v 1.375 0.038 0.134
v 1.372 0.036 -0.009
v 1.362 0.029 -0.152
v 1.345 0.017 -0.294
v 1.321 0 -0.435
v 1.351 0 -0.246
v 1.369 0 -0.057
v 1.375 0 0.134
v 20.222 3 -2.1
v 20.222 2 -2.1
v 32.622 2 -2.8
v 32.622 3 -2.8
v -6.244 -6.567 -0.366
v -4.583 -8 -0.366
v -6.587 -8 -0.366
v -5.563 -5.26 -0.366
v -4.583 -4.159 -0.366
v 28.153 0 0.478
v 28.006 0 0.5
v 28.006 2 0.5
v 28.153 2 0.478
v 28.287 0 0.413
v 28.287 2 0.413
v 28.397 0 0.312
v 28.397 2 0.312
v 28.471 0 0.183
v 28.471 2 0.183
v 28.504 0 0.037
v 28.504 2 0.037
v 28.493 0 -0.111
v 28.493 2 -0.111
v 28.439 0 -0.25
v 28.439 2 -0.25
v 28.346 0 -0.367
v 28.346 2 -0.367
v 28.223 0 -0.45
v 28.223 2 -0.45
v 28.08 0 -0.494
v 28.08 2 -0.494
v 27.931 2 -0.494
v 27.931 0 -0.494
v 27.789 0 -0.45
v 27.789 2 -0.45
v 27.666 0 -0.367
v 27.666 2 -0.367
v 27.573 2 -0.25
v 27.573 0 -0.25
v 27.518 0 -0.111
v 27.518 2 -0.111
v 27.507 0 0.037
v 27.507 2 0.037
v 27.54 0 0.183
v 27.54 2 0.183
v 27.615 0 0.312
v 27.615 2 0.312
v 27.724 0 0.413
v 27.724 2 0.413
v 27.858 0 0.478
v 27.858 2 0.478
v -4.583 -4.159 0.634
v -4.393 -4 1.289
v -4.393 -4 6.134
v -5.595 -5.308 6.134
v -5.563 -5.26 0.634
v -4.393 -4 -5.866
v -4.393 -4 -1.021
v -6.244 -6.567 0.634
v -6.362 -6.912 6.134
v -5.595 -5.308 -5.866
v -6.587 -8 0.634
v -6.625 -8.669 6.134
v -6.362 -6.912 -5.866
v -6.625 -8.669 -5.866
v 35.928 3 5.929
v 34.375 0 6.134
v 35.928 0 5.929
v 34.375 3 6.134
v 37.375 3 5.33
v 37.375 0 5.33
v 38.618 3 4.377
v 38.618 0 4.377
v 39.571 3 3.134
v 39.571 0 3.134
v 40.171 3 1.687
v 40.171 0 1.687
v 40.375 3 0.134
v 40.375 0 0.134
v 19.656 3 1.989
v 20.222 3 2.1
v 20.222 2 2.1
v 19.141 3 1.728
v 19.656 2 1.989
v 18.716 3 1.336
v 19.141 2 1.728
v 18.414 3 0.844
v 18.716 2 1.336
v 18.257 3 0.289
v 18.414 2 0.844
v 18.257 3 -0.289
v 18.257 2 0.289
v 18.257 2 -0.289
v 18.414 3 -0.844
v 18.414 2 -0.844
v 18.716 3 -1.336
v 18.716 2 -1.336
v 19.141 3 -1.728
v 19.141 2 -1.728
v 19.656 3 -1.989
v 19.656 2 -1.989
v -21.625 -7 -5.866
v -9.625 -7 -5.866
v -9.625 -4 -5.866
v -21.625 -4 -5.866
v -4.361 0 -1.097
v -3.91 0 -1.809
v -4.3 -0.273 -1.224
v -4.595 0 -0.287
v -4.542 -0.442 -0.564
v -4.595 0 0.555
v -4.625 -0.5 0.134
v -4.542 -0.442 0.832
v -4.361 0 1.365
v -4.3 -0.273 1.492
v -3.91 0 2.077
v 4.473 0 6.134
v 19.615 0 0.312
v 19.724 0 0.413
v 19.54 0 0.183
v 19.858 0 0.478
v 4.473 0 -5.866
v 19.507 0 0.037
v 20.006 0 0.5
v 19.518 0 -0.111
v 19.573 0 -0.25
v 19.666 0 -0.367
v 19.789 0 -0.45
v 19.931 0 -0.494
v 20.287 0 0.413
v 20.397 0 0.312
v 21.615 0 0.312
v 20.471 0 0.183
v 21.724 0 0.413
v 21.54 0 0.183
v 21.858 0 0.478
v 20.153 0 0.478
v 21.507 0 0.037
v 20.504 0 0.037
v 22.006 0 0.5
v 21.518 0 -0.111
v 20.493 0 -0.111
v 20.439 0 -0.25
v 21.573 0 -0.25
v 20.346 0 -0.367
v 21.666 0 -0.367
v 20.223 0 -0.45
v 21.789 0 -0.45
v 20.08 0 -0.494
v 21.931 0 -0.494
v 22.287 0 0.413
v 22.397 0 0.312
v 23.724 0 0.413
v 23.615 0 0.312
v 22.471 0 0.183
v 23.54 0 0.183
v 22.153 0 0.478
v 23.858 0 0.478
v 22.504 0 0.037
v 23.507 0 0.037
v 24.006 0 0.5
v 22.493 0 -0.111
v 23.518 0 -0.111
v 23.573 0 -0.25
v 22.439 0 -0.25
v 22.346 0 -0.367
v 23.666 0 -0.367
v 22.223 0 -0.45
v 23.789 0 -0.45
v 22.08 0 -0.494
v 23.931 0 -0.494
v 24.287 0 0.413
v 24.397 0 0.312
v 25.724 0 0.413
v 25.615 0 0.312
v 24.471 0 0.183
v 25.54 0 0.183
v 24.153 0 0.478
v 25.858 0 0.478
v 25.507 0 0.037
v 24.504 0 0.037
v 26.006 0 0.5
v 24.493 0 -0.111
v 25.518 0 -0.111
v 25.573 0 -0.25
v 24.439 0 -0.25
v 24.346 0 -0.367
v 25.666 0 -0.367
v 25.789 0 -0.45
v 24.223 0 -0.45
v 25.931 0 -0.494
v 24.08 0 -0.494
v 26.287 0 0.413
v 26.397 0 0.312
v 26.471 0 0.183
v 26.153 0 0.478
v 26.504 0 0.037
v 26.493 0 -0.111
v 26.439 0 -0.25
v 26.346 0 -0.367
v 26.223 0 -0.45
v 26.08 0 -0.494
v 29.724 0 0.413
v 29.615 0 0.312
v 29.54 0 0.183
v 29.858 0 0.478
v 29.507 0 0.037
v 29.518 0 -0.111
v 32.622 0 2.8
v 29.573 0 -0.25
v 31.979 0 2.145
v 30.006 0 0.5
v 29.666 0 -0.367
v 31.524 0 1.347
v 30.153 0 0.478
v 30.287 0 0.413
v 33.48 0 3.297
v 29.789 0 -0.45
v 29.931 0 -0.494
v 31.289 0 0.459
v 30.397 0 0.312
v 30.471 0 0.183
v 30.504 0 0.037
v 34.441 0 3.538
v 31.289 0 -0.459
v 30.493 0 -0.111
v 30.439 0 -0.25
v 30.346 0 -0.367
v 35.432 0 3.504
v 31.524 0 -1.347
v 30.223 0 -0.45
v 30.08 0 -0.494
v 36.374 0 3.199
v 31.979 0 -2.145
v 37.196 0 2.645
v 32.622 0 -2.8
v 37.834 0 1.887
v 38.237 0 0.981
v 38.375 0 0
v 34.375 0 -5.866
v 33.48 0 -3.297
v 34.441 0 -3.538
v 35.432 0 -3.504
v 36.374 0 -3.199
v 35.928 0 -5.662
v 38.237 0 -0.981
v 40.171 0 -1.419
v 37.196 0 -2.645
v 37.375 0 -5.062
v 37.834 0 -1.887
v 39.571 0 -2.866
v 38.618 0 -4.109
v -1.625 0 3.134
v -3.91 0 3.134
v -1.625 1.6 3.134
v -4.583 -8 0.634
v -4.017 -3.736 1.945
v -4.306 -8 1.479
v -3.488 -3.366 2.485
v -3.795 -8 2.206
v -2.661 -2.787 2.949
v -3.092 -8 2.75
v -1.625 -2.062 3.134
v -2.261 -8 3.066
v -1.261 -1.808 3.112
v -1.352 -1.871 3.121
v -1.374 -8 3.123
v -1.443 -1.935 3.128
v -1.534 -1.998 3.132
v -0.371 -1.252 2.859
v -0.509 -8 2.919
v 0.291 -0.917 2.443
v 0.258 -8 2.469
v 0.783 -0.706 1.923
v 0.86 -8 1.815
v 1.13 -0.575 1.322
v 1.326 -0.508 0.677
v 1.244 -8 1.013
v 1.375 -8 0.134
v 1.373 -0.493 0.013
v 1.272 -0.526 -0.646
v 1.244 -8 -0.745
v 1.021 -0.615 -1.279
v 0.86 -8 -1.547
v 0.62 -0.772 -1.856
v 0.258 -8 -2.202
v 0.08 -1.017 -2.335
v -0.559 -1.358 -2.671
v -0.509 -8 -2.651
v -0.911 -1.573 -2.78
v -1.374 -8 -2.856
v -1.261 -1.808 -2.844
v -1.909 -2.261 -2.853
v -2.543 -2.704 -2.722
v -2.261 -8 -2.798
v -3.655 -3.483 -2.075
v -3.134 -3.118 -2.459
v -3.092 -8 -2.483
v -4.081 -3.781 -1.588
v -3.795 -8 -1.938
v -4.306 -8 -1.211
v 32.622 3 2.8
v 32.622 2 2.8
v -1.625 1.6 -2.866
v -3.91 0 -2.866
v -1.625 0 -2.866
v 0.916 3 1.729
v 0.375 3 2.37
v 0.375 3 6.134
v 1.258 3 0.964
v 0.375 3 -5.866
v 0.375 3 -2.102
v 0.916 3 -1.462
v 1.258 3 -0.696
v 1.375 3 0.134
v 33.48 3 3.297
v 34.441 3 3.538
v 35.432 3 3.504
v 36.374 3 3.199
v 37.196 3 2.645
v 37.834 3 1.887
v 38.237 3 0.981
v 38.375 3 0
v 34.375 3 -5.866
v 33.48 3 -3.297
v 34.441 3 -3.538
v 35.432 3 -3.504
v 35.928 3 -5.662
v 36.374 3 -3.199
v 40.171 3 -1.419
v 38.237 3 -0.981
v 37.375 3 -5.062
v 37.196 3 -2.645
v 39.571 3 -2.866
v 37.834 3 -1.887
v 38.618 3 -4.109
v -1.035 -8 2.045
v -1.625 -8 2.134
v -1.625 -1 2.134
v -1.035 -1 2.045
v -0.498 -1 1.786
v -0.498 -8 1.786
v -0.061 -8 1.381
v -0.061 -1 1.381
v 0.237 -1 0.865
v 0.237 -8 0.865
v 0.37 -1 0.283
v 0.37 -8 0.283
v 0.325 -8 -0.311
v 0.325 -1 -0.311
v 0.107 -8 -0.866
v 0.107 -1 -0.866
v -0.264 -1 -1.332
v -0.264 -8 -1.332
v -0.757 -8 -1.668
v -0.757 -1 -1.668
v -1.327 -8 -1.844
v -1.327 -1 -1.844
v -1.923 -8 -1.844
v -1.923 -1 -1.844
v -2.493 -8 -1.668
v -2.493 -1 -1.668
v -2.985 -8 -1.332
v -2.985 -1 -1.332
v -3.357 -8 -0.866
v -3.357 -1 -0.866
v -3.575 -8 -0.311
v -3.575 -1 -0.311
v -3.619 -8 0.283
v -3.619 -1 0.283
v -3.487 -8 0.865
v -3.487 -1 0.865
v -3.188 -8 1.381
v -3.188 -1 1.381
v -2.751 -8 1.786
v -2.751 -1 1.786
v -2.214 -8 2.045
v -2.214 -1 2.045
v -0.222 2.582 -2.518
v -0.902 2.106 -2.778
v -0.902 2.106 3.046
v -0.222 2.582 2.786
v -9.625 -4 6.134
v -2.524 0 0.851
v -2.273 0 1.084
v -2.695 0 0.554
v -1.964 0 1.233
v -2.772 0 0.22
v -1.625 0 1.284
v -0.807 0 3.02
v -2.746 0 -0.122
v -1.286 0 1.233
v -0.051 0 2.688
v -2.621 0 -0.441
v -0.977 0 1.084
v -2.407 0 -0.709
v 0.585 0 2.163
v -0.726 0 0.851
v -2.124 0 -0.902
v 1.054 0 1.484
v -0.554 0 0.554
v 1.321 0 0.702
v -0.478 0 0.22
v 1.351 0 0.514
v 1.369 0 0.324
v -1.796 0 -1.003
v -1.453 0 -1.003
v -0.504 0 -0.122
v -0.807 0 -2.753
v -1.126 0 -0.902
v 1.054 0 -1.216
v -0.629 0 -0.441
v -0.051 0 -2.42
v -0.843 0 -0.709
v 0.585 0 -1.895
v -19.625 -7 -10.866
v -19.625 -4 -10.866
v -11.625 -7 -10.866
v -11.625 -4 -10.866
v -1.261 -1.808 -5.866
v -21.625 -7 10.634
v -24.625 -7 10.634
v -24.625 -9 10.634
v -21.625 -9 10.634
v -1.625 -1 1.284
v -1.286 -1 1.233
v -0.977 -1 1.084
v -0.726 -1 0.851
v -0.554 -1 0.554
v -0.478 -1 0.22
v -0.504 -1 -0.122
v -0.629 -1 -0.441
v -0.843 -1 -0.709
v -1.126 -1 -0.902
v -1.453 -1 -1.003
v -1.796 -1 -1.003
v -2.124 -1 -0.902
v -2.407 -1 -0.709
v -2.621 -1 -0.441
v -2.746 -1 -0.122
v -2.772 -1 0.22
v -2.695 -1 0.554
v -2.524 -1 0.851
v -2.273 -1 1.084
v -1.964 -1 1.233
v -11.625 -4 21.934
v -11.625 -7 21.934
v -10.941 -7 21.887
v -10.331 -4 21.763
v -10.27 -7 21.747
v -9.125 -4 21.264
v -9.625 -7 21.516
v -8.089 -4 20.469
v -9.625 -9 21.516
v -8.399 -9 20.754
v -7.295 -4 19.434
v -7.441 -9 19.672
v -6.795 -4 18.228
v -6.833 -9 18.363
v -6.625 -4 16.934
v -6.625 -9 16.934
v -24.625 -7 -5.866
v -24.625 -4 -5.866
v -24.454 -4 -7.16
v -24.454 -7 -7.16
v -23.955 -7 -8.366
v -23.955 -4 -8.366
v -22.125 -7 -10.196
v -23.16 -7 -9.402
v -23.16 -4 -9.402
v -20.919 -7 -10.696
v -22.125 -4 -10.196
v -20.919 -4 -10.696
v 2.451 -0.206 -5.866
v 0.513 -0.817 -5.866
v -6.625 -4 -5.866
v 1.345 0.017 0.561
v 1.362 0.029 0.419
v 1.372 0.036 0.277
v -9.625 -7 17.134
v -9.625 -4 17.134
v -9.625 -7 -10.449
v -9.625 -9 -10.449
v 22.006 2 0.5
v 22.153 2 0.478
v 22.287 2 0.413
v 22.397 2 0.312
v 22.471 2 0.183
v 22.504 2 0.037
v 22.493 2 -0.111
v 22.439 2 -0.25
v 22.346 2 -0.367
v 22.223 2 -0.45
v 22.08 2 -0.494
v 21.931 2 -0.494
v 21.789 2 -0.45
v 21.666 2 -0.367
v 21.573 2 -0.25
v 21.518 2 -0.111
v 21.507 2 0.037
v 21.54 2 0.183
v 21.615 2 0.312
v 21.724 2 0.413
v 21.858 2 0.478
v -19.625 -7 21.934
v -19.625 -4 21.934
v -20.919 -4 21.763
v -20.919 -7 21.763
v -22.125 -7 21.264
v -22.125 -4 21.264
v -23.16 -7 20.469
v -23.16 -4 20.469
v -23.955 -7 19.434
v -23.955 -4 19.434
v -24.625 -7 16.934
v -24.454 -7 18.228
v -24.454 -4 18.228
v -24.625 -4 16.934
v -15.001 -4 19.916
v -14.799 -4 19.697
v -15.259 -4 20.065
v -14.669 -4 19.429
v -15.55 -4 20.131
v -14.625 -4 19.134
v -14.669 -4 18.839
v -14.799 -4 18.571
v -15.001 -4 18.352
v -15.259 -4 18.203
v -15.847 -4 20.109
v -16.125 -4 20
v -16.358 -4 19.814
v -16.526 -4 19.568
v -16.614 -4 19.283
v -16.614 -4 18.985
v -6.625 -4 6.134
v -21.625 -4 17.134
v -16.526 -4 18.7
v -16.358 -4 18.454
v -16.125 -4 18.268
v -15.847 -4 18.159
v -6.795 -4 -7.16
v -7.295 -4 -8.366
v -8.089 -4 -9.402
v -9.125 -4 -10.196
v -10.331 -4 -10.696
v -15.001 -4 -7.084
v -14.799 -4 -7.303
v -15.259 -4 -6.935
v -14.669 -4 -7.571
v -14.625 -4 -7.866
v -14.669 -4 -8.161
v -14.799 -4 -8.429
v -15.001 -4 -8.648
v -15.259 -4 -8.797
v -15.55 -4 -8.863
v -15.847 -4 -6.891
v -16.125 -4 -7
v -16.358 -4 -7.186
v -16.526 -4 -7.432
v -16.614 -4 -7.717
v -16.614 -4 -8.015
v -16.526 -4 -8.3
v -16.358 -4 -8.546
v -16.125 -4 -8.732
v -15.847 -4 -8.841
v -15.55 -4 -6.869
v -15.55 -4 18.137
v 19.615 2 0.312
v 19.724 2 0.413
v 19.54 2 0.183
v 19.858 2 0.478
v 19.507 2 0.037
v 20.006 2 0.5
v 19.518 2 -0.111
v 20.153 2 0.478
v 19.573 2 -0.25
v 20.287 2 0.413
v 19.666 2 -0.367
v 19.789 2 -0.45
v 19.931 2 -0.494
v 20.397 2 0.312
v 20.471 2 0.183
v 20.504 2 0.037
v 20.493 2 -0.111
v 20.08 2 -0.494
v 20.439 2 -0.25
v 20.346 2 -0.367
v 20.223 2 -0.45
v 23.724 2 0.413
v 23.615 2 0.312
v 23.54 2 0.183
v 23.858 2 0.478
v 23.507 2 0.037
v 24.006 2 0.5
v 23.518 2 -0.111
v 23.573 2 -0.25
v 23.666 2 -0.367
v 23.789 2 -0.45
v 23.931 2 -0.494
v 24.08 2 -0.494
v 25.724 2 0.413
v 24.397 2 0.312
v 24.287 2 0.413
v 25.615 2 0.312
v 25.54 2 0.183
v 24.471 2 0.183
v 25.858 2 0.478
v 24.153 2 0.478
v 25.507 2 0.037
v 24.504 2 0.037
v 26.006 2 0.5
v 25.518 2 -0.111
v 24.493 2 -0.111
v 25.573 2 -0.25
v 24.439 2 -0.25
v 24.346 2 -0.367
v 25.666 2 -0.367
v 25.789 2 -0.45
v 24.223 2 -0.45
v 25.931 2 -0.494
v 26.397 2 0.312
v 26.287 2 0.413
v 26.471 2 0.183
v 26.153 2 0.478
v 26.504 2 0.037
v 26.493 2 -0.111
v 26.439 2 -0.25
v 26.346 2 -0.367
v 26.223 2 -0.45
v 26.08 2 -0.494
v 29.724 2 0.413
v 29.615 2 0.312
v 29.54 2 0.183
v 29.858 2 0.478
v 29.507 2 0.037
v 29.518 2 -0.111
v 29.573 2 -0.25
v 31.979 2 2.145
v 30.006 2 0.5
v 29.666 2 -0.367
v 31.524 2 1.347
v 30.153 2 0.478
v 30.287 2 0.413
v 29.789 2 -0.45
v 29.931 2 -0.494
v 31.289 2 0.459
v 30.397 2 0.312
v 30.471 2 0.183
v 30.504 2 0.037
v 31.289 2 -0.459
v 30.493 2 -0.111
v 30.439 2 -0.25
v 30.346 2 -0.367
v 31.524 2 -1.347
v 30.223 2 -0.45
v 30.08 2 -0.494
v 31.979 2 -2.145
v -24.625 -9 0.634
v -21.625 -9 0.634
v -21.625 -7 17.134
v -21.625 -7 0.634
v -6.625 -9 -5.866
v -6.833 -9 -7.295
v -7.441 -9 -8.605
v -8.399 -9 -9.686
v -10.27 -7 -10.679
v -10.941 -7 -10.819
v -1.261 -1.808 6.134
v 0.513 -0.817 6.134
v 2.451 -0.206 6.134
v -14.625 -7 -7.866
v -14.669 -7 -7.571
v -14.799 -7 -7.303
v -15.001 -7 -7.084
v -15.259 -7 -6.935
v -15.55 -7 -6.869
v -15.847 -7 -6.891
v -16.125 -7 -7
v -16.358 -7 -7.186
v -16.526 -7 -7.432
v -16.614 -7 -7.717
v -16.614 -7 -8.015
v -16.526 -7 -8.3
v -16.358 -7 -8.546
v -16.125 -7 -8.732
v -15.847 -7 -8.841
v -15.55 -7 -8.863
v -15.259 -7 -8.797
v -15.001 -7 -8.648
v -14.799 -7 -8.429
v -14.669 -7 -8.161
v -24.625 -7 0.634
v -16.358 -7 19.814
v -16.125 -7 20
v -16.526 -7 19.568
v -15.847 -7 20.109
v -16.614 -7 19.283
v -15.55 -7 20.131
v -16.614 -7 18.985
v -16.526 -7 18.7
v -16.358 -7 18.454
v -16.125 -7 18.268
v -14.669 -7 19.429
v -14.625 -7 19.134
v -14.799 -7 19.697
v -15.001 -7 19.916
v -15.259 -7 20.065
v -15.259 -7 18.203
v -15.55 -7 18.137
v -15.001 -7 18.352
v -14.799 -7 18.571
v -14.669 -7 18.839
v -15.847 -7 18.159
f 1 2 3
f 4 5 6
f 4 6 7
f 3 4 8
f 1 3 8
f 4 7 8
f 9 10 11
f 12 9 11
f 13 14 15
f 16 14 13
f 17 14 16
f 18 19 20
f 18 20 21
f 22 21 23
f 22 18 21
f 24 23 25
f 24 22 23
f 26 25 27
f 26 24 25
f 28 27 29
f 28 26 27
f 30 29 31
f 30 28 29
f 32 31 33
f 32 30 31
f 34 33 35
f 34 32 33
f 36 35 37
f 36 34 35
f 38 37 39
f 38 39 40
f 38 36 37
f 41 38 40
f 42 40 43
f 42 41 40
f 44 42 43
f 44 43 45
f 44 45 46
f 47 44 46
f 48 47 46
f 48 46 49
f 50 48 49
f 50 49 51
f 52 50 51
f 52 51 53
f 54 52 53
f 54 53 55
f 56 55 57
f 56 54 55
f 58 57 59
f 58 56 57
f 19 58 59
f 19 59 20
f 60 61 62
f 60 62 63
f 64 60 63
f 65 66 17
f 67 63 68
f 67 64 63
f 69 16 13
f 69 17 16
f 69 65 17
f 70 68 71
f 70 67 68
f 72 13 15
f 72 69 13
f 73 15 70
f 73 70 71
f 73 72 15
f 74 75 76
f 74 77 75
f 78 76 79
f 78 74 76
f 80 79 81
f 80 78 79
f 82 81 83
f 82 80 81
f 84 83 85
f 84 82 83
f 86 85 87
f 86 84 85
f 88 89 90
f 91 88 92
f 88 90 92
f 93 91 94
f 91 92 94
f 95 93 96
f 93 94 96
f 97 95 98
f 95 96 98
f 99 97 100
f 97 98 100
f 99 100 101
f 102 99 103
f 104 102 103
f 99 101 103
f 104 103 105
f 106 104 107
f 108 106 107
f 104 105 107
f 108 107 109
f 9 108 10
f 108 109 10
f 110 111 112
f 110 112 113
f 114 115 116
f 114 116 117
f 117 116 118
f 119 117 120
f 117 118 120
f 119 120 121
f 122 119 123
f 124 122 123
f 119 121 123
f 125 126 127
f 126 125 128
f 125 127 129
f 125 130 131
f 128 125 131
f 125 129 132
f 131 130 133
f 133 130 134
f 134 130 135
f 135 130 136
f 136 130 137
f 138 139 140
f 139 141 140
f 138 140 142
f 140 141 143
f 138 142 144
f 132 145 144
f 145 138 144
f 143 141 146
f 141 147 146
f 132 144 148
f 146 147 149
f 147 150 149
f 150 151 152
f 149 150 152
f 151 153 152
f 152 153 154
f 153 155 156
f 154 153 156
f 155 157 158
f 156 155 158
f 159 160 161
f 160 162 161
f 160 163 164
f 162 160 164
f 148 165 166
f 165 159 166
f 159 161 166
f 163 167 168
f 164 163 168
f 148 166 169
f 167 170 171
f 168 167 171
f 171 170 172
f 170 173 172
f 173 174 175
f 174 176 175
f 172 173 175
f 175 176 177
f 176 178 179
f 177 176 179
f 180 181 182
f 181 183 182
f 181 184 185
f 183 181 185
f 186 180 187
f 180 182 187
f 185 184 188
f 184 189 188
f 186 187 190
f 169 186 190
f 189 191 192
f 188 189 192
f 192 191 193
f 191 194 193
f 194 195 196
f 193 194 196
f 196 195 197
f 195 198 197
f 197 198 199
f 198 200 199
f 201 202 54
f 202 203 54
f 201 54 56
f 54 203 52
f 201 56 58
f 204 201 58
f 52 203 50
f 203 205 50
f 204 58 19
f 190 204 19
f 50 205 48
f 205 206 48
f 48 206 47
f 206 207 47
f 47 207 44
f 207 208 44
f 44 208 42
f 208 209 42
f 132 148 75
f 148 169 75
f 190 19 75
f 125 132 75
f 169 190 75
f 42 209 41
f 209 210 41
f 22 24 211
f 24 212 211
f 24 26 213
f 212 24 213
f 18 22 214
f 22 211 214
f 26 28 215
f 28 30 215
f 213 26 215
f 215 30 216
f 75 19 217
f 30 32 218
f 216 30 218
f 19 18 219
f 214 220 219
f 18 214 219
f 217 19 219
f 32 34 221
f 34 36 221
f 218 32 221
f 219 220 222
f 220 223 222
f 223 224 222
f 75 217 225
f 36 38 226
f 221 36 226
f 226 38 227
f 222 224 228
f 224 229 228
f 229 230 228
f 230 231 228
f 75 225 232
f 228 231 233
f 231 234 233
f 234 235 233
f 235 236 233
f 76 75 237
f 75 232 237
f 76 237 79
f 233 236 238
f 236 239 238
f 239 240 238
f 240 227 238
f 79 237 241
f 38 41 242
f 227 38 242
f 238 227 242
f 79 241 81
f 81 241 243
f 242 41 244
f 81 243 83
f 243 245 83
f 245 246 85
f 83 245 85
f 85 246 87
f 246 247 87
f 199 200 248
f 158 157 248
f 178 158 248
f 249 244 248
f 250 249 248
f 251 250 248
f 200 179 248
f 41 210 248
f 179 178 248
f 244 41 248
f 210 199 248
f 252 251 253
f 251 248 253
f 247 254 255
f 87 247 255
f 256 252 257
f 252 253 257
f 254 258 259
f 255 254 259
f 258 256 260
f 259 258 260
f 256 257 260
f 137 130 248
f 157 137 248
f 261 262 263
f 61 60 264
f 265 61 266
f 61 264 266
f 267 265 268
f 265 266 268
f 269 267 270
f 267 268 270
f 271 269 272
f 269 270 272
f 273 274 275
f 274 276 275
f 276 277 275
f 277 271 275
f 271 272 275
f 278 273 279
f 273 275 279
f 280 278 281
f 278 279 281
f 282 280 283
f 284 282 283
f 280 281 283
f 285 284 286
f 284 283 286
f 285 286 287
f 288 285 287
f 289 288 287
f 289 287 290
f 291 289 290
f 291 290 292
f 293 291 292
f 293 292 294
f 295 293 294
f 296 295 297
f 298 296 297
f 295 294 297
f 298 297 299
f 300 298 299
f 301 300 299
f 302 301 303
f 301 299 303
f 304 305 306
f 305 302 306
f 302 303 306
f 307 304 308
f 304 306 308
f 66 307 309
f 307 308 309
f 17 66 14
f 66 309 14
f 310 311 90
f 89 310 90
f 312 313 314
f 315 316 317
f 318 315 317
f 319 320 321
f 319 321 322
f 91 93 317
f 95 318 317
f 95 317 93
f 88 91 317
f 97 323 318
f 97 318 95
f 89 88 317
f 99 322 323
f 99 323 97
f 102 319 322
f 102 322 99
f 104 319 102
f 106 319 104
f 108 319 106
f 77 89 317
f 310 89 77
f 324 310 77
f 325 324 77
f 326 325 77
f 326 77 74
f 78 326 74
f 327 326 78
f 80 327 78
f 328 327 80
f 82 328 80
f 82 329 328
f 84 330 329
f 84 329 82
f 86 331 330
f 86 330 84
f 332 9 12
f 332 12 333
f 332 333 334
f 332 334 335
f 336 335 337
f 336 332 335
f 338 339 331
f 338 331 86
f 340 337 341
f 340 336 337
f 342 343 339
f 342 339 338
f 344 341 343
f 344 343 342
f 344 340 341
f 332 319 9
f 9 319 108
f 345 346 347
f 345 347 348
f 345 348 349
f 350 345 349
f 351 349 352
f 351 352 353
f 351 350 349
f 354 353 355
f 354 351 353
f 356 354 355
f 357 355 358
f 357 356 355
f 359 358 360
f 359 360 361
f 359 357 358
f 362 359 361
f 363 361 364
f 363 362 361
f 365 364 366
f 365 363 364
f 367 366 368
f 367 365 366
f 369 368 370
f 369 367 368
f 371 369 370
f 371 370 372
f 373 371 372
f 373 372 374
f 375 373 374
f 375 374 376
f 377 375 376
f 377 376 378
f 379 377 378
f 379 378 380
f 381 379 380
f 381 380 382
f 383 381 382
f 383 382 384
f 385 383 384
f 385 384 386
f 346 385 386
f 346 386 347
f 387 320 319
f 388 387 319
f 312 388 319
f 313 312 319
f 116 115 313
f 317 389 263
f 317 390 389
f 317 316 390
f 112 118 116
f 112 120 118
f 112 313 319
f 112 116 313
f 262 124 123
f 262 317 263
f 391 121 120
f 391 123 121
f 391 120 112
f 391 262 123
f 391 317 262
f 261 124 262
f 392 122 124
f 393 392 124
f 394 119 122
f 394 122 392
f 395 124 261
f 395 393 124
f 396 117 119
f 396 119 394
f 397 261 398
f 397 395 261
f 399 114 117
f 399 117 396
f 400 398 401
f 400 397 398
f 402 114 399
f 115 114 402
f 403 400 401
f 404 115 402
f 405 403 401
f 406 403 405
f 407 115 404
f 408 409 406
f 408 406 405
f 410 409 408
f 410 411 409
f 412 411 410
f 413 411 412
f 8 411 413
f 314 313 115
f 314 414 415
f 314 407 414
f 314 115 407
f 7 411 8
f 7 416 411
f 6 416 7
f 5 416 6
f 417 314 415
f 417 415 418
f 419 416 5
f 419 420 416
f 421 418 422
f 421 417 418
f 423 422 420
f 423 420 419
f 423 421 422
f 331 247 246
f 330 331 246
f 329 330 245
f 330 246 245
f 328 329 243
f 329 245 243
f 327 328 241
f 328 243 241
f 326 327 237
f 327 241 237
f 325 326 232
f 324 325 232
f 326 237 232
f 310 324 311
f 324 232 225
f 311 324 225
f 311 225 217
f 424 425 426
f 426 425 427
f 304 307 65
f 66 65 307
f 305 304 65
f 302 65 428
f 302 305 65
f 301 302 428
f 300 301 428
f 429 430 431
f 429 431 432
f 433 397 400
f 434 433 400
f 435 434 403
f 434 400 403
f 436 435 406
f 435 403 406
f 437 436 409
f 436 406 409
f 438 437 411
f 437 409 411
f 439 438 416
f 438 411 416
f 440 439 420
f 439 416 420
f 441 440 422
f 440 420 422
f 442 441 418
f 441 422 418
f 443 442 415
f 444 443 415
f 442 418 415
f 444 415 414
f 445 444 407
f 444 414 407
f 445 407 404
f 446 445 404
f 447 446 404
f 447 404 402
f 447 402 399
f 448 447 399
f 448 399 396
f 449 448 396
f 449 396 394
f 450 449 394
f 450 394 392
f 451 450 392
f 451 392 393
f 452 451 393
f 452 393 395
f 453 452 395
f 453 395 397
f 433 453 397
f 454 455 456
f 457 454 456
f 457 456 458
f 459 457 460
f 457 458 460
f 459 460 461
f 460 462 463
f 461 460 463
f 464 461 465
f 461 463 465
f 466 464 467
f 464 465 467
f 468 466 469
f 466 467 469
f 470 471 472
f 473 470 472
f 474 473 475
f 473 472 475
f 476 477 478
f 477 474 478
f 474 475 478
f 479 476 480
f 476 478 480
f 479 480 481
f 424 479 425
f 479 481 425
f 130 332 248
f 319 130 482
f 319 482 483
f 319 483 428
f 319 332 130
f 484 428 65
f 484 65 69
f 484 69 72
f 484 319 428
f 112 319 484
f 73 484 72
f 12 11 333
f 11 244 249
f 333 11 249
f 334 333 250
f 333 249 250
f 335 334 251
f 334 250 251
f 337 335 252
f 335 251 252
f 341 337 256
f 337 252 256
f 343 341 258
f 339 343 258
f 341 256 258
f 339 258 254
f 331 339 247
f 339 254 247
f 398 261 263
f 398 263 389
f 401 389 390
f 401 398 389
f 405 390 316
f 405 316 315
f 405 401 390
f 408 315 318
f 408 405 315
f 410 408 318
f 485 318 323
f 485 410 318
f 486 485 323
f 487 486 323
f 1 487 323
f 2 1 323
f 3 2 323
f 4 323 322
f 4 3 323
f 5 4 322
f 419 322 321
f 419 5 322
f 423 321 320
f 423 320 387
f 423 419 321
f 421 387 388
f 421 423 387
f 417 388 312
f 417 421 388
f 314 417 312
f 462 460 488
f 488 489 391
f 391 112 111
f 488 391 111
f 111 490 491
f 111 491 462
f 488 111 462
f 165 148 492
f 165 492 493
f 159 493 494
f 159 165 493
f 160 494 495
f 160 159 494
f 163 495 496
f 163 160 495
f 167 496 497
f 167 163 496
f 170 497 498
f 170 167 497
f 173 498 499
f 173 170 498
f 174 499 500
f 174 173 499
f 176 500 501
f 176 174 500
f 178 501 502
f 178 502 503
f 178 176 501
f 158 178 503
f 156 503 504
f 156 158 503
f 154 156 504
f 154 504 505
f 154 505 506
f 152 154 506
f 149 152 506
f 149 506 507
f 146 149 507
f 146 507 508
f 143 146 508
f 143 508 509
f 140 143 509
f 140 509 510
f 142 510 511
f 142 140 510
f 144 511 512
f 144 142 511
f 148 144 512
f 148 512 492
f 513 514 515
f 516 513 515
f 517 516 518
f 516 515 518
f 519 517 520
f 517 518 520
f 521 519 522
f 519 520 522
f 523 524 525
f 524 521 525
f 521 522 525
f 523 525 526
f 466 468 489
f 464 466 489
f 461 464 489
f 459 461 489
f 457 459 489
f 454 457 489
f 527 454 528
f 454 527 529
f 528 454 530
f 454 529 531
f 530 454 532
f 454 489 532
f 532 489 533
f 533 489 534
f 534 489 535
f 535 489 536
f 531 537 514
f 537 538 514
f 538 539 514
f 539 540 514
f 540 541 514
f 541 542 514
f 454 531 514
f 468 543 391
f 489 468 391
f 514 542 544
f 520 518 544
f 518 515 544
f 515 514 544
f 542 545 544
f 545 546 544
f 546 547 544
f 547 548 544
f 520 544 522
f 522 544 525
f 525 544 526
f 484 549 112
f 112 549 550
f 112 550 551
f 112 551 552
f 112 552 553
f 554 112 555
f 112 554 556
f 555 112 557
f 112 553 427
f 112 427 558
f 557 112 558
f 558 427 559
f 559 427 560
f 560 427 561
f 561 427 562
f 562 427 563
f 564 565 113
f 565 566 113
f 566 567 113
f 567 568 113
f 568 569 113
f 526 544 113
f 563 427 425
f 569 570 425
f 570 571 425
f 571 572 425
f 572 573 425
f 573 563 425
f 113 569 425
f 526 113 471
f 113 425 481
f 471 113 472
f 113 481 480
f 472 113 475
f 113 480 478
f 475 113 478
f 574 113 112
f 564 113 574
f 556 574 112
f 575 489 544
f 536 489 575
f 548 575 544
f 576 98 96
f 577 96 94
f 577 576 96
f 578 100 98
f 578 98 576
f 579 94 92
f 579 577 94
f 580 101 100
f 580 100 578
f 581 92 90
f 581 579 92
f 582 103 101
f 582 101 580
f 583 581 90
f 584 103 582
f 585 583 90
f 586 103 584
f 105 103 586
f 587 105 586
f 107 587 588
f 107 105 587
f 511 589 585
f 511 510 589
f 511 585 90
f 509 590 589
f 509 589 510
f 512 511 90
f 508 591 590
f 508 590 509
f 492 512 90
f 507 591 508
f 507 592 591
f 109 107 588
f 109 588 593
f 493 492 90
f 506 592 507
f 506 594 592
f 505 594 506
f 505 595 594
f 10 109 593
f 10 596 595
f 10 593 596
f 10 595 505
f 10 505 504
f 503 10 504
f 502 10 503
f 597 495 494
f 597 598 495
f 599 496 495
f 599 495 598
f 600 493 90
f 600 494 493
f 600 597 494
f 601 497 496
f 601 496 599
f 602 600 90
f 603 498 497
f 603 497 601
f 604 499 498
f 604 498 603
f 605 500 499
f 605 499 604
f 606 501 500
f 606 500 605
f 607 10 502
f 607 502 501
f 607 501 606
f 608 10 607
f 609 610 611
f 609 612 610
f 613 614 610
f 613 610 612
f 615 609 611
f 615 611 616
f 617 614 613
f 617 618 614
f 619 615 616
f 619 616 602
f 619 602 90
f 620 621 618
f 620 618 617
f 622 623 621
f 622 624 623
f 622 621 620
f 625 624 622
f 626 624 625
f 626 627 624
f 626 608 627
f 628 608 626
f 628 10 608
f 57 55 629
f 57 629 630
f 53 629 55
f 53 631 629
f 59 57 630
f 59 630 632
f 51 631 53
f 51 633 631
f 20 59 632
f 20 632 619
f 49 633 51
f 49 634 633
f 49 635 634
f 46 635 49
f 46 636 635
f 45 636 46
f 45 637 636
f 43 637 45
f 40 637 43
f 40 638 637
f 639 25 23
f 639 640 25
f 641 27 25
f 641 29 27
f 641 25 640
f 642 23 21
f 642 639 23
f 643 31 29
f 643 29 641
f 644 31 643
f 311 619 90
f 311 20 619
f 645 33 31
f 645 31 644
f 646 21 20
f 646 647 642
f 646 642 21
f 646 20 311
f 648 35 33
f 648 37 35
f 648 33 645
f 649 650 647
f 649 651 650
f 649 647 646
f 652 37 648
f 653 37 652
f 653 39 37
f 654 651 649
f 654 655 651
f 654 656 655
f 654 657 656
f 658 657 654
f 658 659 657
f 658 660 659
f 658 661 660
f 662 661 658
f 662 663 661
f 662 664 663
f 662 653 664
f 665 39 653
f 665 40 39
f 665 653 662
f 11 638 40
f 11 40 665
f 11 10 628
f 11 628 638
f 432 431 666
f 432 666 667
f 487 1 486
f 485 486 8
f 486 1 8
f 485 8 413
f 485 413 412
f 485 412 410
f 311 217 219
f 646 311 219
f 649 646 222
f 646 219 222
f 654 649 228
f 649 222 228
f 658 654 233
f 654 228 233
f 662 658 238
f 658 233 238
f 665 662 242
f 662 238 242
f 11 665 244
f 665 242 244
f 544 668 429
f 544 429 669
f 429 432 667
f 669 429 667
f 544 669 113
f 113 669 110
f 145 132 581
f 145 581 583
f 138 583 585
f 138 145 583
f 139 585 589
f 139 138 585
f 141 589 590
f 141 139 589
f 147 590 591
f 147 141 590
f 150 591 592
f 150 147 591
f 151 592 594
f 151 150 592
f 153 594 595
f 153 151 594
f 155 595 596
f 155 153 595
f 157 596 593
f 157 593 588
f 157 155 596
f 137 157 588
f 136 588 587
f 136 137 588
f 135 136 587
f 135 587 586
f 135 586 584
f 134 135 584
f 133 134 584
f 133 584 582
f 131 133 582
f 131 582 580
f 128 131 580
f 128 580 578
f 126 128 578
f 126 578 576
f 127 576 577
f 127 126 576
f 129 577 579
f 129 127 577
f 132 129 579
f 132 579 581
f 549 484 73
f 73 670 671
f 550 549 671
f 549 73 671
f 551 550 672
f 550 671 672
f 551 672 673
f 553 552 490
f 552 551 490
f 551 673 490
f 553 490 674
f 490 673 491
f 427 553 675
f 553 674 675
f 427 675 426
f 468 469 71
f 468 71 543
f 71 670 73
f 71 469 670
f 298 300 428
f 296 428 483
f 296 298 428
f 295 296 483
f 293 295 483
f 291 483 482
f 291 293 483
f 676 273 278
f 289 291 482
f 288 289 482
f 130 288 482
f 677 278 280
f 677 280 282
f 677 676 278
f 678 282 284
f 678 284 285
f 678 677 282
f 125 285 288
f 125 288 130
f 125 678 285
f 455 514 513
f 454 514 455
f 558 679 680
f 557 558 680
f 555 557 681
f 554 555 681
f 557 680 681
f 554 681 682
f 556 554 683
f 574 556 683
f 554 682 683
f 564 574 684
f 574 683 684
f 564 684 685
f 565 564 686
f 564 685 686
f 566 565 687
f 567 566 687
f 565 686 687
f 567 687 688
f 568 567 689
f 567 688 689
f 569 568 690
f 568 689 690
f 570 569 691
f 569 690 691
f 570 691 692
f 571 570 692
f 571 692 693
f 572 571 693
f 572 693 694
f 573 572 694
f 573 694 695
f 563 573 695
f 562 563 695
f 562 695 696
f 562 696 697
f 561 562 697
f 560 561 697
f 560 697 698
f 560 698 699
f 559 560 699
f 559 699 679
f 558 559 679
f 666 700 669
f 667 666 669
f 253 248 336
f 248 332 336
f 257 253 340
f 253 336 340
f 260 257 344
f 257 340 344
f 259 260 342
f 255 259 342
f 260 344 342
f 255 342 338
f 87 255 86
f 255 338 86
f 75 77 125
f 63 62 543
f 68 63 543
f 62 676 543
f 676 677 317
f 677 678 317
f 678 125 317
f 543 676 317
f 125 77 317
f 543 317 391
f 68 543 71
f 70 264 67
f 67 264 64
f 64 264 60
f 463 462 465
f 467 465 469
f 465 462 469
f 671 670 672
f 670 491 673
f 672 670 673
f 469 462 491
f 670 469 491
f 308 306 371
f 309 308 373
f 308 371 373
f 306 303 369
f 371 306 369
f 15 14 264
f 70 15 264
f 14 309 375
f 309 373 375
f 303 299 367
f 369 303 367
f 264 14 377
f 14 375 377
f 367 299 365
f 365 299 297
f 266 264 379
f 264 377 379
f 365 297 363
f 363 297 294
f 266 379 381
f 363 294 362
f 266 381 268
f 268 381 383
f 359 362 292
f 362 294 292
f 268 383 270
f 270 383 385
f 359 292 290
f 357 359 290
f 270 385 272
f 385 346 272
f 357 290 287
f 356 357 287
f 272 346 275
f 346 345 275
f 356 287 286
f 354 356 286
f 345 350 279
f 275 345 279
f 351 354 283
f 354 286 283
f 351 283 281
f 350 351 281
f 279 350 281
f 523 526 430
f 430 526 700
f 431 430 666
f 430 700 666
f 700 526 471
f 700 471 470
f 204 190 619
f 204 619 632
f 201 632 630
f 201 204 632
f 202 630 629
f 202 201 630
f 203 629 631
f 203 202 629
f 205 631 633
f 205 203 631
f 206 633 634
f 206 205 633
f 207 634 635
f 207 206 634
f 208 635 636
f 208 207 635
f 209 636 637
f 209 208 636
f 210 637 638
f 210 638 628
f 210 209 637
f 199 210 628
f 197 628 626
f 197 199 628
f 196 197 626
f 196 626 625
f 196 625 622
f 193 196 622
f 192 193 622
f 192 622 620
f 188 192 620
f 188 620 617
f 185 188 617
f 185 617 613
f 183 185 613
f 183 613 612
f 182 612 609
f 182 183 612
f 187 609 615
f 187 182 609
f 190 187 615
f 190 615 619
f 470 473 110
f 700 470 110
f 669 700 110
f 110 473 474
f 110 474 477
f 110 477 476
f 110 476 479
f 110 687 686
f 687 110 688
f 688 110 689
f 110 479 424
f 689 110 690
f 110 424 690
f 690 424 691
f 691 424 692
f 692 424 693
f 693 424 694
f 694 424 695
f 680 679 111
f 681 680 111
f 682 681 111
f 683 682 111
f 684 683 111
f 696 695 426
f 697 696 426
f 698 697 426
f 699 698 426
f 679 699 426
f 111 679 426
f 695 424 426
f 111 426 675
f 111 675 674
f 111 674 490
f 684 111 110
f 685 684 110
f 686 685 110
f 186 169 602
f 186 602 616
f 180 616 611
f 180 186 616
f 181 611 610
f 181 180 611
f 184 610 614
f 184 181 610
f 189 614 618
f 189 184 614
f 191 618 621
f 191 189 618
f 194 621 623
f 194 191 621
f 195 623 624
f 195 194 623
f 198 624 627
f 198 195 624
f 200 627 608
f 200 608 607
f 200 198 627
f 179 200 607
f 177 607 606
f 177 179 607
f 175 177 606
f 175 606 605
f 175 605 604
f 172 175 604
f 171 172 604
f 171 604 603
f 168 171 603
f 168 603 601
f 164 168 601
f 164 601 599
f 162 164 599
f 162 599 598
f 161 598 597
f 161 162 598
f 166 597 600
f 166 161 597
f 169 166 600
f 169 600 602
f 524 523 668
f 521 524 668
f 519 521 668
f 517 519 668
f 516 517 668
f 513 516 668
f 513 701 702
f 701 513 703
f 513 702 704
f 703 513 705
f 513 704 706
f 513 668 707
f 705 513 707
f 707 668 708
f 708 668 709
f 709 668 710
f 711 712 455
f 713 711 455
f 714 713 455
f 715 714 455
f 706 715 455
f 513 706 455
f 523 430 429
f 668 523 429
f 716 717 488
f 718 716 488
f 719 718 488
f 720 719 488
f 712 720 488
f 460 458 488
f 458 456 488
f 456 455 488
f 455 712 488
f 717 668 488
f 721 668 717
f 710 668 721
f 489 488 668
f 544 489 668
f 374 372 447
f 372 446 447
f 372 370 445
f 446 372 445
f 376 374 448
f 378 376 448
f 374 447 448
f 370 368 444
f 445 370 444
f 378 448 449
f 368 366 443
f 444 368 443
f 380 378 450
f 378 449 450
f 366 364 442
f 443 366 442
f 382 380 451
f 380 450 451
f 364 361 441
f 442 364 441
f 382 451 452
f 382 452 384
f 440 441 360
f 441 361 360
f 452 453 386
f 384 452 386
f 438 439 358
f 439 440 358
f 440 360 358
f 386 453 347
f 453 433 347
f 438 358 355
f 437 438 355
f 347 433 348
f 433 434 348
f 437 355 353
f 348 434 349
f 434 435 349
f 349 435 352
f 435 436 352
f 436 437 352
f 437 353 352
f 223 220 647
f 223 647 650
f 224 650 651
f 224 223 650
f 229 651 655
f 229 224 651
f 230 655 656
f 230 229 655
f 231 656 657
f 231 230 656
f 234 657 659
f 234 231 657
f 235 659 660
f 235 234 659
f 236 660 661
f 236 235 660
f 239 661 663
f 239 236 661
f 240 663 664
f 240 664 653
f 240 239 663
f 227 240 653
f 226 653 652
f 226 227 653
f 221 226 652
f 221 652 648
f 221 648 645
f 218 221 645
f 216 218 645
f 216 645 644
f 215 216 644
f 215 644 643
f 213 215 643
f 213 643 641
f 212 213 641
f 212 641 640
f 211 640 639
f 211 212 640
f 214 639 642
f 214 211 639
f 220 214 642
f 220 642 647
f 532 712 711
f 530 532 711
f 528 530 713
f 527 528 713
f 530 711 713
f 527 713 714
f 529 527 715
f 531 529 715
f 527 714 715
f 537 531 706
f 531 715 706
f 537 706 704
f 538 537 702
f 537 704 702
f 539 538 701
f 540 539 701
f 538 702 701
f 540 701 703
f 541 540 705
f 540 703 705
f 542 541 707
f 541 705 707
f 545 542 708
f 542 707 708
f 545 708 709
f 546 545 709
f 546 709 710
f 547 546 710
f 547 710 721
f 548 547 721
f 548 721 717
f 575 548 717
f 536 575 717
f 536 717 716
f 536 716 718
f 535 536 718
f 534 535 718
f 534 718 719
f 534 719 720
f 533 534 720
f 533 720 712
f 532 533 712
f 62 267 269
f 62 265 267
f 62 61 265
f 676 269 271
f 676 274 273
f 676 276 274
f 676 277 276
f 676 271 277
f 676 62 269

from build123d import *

# Parameters (mm, degrees)
BOSS_EXTRUDE1_DEPTH     = 3
SKETCH1_7_R             = 0.5
BOSS_EXTRUDE2_DEPTH     = 2
BOSS_EXTRUDE4_REACH     = 44.227
SKETCH4_W               = 3
SKETCH4_H               = 12
BOSS_EXTRUDE5_DEPTH     = 5
FILLET3_R               = 10
BOSS_EXTRUDE11_START    = -17
BOSS_EXTRUDE11_DEPTH    = 32.8
SKETCH12_R              = 1
SKETCH12_W              = 12
SKETCH12_H              = 23
CUT_EXTRUDE2_DEPTH      = 48.02396982
FILLET7_R               = 6
FILLET8_R               = 6
SKETCH13_W              = 3
SKETCH13_H              = 10
BOSS_EXTRUDE12_DEPTH    = 2
FILLET9_R               = 5
BOSS_EXTRUDE13_START    = -8
SKETCH1_9_R             = 3
SKETCH1_9_R_2           = 2
BOSS_EXTRUDE13_DEPTH    = 8
CUT_EXTRUDE3_DEPTH      = 8
CUT_EXTRUDE3_DEPTH_BACK = 8
SKETCH1_10_R            = 2
SKETCH1_10_R_2          = 1.15
BOSS_EXTRUDE14_START    = -1
SKETCH1_11_R            = 2
BOSS_EXTRUDE14_DEPTH    = 1
SKETCH1_12_R            = 3
CUT_EXTRUDE4_DEPTH      = 5
SKETCH1_13_R            = 1.15
CUT_EXTRUDE5_DEPTH      = 5
SKETCH17_W              = 11.286302552
SKETCH17_H              = 6
CUT_EXTRUDE6_DEPTH      = 6
BOSS_EXTRUDE15_START    = -3.840535
SKETCH18_W              = 2.041960109
SKETCH18_H              = 1
BOSS_EXTRUDE15_DEPTH    = 3.840535


# Read off the part's stored shape, not the designer's step: Boss-Extrude11
# Some blends are built 0.0001 mm under size
with BuildPart() as part:
    # Sketch1 → Boss-Extrude1 (new body)
    with BuildSketch(Plane(origin=(0, 0, 0), x_dir=(1, 0, 0), z_dir=(0, 1, 0))):
        with BuildLine():
            Line((40.375241408, 5.866153579), (0.375241408, 5.866153579))
            Line((0.375241408, 5.866153579), (0.375241408, 2.102221557))
            ThreePointArc((0.375241408, 2.102221557), (1.113854196, 1.090898451), (1.375241408, -0.133846421))
            ThreePointArc((1.375241408, -0.133846421), (1.113854196, -1.358591292), (0.375241408, -2.369914398))
            Line((0.375241408, -2.369914398), (0.375241408, -6.133846421))
            Line((0.375241408, -6.133846421), (40.375241408, -6.133846421))
            Line((40.375241408, -6.133846421), (40.375241408, 5.866153579))
        make_face()
        with BuildLine():
            Line((32.622415803, -2.8), (20.221989119, -2.1))
            ThreePointArc((20.221989119, -2.1), (18.237190195, 0), (20.221989119, 2.1))
            Line((20.221989119, 2.1), (32.622415803, 2.8))
            ThreePointArc((32.622415803, 2.8), (36.374444489, 3.199023384), (38.375241408, 0))
            ThreePointArc((38.375241408, 0), (36.374444489, -3.199023384), (32.622415803, -2.8))
        make_face(mode=Mode.SUBTRACT)
    extrude(amount=BOSS_EXTRUDE1_DEPTH)

    # Sketch1<7> → Boss-Extrude2 (add)
    with BuildSketch(Plane(origin=(0, 0, 0), x_dir=(1, 0, 0), z_dir=(0, 1, 0))):
        with BuildLine():
            ThreePointArc((20.221989119, 2.1), (18.237190195, 0), (20.221989119, -2.1))
            Line((20.221989119, -2.1), (32.622415803, -2.8))
            ThreePointArc((32.622415803, -2.8), (31.259607239, 0), (32.622415803, 2.8))
            Line((32.622415803, 2.8), (20.221989119, 2.1))
        make_face()
        with Locations(Location((20.005781193, 0, 0), (0, 0, 270))):
            Circle(SKETCH1_7_R, mode=Mode.SUBTRACT)
        with Locations(Location((22.005781193, 0, 0), (0, 0, 270))):
            Circle(SKETCH1_7_R, mode=Mode.SUBTRACT)
        with Locations(Location((24.005781193, 0, 0), (0, 0, 270))):
            Circle(SKETCH1_7_R, mode=Mode.SUBTRACT)
        with Locations(Location((26.005781193, 0, 0), (0, 0, 270))):
            Circle(SKETCH1_7_R, mode=Mode.SUBTRACT)
        with Locations(Location((28.005781193, 0, 0), (0, 0, 270))):
            Circle(SKETCH1_7_R, mode=Mode.SUBTRACT)
        with Locations(Location((30.005781193, 0, 0), (0, 0, 270))):
            Circle(SKETCH1_7_R, mode=Mode.SUBTRACT)
    extrude(amount=BOSS_EXTRUDE2_DEPTH)

    # Boss-Extrude4: up to this face of the body (flat: up to its plane)
    boss_extrude4_end = Plane(part.part.faces().sort_by_distance((20.375241408, 1.5, -5.866153579))[0])
    # Sketch3 → Boss-Extrude4 (add, up to the picked face)
    with BuildSketch(Plane.XY.offset(6.133846421), mode=Mode.PRIVATE) as boss_extrude4_sk1:
        Polygon((0.375241408, 3), (-9.624758592, -4), (-4.393377613, -4), (5.606622387, 3), align=None)
    boss_extrude4_tool1 = split(extrude(boss_extrude4_sk1.sketch, amount=-BOSS_EXTRUDE4_REACH, mode=Mode.PRIVATE), bisect_by=boss_extrude4_end, keep=Keep.BOTH, mode=Mode.PRIVATE)
    add(boss_extrude4_tool1.solids().sort_by(Axis((-2.009068, -0.5, 6.133846), (0, 0, -1)))[0])

    # Sketch4 → Boss-Extrude5 (add)
    with BuildSketch(Plane(origin=(0, -4, 0), x_dir=(-1, 0, 0), z_dir=(0, -1, 0))):
        with Locations((8.124758592, -0.133846421)):
            Rectangle(SKETCH4_W, SKETCH4_H)
    extrude(amount=BOSS_EXTRUDE5_DEPTH)

    # Fillet3
    # the kernel refuses this fillet: 10 mm, written as the material it adds along each edge
    with BuildSketch(Plane(origin=(1.320908101, 0, 6.133846421), x_dir=(1, 0, 0), z_dir=(0, 0, -1))) as fillet3_piece_1_section:
        with BuildLine():
            CenterArc((FILLET3_R * 0.315222230819, FILLET3_R), FILLET3_R, 235.007979801, 34.992020199)
            Line((-FILLET3_R * 0.258240113544, FILLET3_R * 0.180768079481), (0, 0))
            Line((0, 0), (FILLET3_R * 0.315222230819, 0))
        make_face()
    fillet3_piece_1 = extrude(amount=13.312182885, mode=Mode.PRIVATE)
    fillet3_piece_1 = split(fillet3_piece_1, bisect_by=Plane(origin=(1.586628452, -0.313093782, -5.866153579), z_dir=(0, 0, 1)), keep=Keep.TOP, mode=Mode.PRIVATE)
    fillet3_piece_1 = fillet3_piece_1 - Plane(origin=(-1.624758592, -0.313093782, 0.133846421), x_dir=(0.6666666666666657, 0, -0.7453559924999308), z_dir=(0, -1, 0)) * Cylinder(3, 40, mode=Mode.PRIVATE)
    add(fillet3_piece_1)
    with BuildSketch(Plane(origin=(1.320908101, 0, 7.446029306), x_dir=(1, 0, 0), z_dir=(0, 0, -1))) as fillet3_piece_2_section:
        with BuildLine():
            CenterArc((FILLET3_R * 0.315222230819, FILLET3_R), FILLET3_R, 235.007979801, 34.992020199)
            Line((-FILLET3_R * 0.258240113544, FILLET3_R * 0.180768079481), (0, 0))
            Line((0, 0), (FILLET3_R * 0.315222230819, 0))
        make_face()
    fillet3_piece_2 = extrude(amount=13.312182885, mode=Mode.PRIVATE)
    fillet3_piece_2 = split(fillet3_piece_2, bisect_by=Plane(origin=(1.586628452, -0.313093782, 6.133846421), z_dir=(0, 0, -1)), keep=Keep.TOP, mode=Mode.PRIVATE)
    fillet3_piece_2 = fillet3_piece_2 - Plane(origin=(-1.624758592, -0.313093782, 0.133846421), x_dir=(0.6666666666666657, 0, -0.7453559924999308), z_dir=(0, -1, 0)) * Cylinder(3, 40, mode=Mode.PRIVATE)
    add(fillet3_piece_2)

    # Boss-Extrude11 outline → Boss-Extrude11 (add)
    with BuildSketch(Plane.XY.offset(6.133846421).offset(BOSS_EXTRUDE11_START)):
        Polygon((-9.624758592, -7), (-9.624758592, -9), (-6.624758592, -9), (-6.624758592, -4), (-24.624758592, -4), (-24.624758592, -7), align=None)
    extrude(amount=BOSS_EXTRUDE11_DEPTH)

    # Sketch12 → Cut-Extrude2 (cut, through all)
    with BuildSketch(Plane(origin=(0, -7, 0), x_dir=(-1, 0, 0), z_dir=(0, -1, 0))):
        with Locations(Location((15.624758592, -19.133846421, 0), (0, 0, 180))):
            Circle(SKETCH12_R)
        with Locations(Location((15.624758592, 7.866153579, 0), (0, 0, 180))):
            Circle(SKETCH12_R)
        with Locations((15.624758592, -5.633846421)):
            Rectangle(SKETCH12_W, SKETCH12_H)
    extrude(amount=-CUT_EXTRUDE2_DEPTH, mode=Mode.SUBTRACT)

    # Fillet7
    fillet7_edges = [part.edges().sort_by_distance(p)[0] for p in [
        (40.375241408, 1.5, -5.866153579),
        (40.375241408, 1.5, 6.133846421),
    ]]
    fillet(fillet7_edges, radius=FILLET7_R - 0.0001)  # a hair under: the kernel refuses the full size

    # Fillet8
    # the kernel refuses this fillet: 6 mm, written as the material it adds along each edge
    with BuildSketch(Plane(origin=(-6.624758592, -4, -5.866153579), x_dir=(1, 0, 0), z_dir=(0, 0, 1))) as fillet8_piece_1:
        with BuildLine():
            CenterArc((6, -4.668780426), FILLET8_R, 128.910316117, 51.089683883)
            Line((0, -4.668780426), (0, 0))
            Line((0, 0), (2.231380978, 0))
        make_face()
    extrude(amount=12)

    # Sketch13 → Boss-Extrude12 (add)
    with BuildSketch(Plane.XZ.offset(7)):
        with Locations((-23.124758592, 5.633846421)):
            Rectangle(SKETCH13_W, SKETCH13_H)
    extrude(amount=BOSS_EXTRUDE12_DEPTH)

    # Fillet9
    # the kernel refuses this fillet: 5 mm, written as the material it takes off along each edge
    with BuildSketch(Plane(origin=(-6.624758592, -21.5, -10.866153579), x_dir=(0, 0, 1), z_dir=(0, 1, 0))) as fillet9_piece_1:
        with BuildLine():
            CenterArc((FILLET9_R, -FILLET9_R), FILLET9_R, 90, 90)
            Line((0, -FILLET9_R), (0, 0))
            Line((0, 0), (FILLET9_R, 0))
        make_face()
    extrude(amount=30, mode=Mode.SUBTRACT)
    with BuildSketch(Plane(origin=(-24.624758592, 8.5, -10.866153579), x_dir=(1, 0, 0), z_dir=(0, -1, 0))) as fillet9_piece_2:
        with BuildLine():
            CenterArc((FILLET9_R, FILLET9_R), FILLET9_R, 180, 90)
            Line((0, FILLET9_R), (0, 0))
            Line((0, 0), (FILLET9_R, 0))
        make_face()
    extrude(amount=28, mode=Mode.SUBTRACT)
    with BuildSketch(Plane(origin=(-24.624758592, 8.5, 21.933846421), x_dir=(1, 0, 0), z_dir=(0, -1, 0))) as fillet9_piece_3:
        with BuildLine():
            CenterArc((FILLET9_R, -FILLET9_R), FILLET9_R, 90, 90)
            Line((0, -FILLET9_R), (0, 0))
            Line((0, 0), (FILLET9_R, 0))
        make_face()
    extrude(amount=28, mode=Mode.SUBTRACT)
    with BuildSketch(Plane(origin=(-6.624758592, -21.5, 21.933846421), x_dir=(0, 0, -1), z_dir=(0, 1, 0))) as fillet9_piece_4:
        with BuildLine():
            CenterArc((FILLET9_R, FILLET9_R), FILLET9_R, 180, 90)
            Line((0, FILLET9_R), (0, 0))
            Line((0, 0), (FILLET9_R, 0))
        make_face()
    extrude(amount=30, mode=Mode.SUBTRACT)

    # Sketch1<9> → Boss-Extrude13 (add)
    with BuildSketch(Plane(origin=(0, 0, 0), x_dir=(1, 0, 0), z_dir=(0, 1, 0)).offset(BOSS_EXTRUDE13_START)):
        with Locations(Location((-1.624758592, -0.133846421, 0), (0, 0, 270))):
            Circle(SKETCH1_9_R)
        with Locations(Location((-1.624758592, -0.133846421, 0), (0, 0, 270))):
            Circle(SKETCH1_9_R_2, mode=Mode.SUBTRACT)
    extrude(amount=BOSS_EXTRUDE13_DEPTH)

    # Sketch1<10> → Cut-Extrude3 (cut, two sides: drawn at the far end of the back side and taken through both)
    with BuildSketch(Plane(origin=(0, 0, 0), x_dir=(1, 0, 0), z_dir=(0, 1, 0)).offset(-CUT_EXTRUDE3_DEPTH_BACK)):
        with Locations(Location((-1.624758592, -0.133846421, 0), (0, 0, 270))):
            Circle(SKETCH1_10_R)
        with Locations((-1.624758592, -0.133846421)):
            Circle(SKETCH1_10_R_2)
    extrude(amount=CUT_EXTRUDE3_DEPTH + CUT_EXTRUDE3_DEPTH_BACK, mode=Mode.SUBTRACT)

    # Sketch1<11> → Boss-Extrude14 (add)
    with BuildSketch(Plane(origin=(0, 0, 0), x_dir=(1, 0, 0), z_dir=(0, 1, 0)).offset(BOSS_EXTRUDE14_START)):
        with Locations(Location((-1.624758592, -0.133846421, 0), (0, 0, 270))):
            Circle(SKETCH1_11_R)
    extrude(amount=BOSS_EXTRUDE14_DEPTH)

    # Sketch1<12> → Cut-Extrude4 (cut)
    with BuildSketch(Plane(origin=(0, 0, 0), x_dir=(1, 0, 0), z_dir=(0, 1, 0))):
        with Locations(Location((-1.624758592, -0.133846421, 0), (0, 0, 270))):
            Circle(SKETCH1_12_R)
    extrude(amount=CUT_EXTRUDE4_DEPTH, mode=Mode.SUBTRACT)

    # Sketch1<13> → Cut-Extrude5 (cut)
    with BuildSketch(Plane(origin=(0, 0, 0), x_dir=(1, 0, 0), z_dir=(0, 1, 0))):
        with Locations(Location((-1.624758592, -0.133846421, 0), (0, 0, 270))):
            Circle(SKETCH1_13_R)
    extrude(amount=-CUT_EXTRUDE5_DEPTH, mode=Mode.SUBTRACT)

    # Sketch17 → Cut-Extrude6 (cut)
    with BuildSketch(Plane(origin=(0, 0, 0), x_dir=(1, 0, 0), z_dir=(0, 1, 0))):
        with Locations((-7.267909868, -0.133846421)):
            Rectangle(SKETCH17_W, SKETCH17_H)
    extrude(amount=CUT_EXTRUDE6_DEPTH, mode=Mode.SUBTRACT)

    # Sketch18 → Boss-Extrude15 (add)
    with BuildSketch(Plane(origin=(0, -8, 0), x_dir=(-1, 0, 0), z_dir=(0, -1, 0)).offset(BOSS_EXTRUDE15_START)):
        with Locations((5.603778538, -0.133846421)):
            Rectangle(SKETCH18_W, SKETCH18_H)
    extrude(amount=BOSS_EXTRUDE15_DEPTH)


solid = part.part
